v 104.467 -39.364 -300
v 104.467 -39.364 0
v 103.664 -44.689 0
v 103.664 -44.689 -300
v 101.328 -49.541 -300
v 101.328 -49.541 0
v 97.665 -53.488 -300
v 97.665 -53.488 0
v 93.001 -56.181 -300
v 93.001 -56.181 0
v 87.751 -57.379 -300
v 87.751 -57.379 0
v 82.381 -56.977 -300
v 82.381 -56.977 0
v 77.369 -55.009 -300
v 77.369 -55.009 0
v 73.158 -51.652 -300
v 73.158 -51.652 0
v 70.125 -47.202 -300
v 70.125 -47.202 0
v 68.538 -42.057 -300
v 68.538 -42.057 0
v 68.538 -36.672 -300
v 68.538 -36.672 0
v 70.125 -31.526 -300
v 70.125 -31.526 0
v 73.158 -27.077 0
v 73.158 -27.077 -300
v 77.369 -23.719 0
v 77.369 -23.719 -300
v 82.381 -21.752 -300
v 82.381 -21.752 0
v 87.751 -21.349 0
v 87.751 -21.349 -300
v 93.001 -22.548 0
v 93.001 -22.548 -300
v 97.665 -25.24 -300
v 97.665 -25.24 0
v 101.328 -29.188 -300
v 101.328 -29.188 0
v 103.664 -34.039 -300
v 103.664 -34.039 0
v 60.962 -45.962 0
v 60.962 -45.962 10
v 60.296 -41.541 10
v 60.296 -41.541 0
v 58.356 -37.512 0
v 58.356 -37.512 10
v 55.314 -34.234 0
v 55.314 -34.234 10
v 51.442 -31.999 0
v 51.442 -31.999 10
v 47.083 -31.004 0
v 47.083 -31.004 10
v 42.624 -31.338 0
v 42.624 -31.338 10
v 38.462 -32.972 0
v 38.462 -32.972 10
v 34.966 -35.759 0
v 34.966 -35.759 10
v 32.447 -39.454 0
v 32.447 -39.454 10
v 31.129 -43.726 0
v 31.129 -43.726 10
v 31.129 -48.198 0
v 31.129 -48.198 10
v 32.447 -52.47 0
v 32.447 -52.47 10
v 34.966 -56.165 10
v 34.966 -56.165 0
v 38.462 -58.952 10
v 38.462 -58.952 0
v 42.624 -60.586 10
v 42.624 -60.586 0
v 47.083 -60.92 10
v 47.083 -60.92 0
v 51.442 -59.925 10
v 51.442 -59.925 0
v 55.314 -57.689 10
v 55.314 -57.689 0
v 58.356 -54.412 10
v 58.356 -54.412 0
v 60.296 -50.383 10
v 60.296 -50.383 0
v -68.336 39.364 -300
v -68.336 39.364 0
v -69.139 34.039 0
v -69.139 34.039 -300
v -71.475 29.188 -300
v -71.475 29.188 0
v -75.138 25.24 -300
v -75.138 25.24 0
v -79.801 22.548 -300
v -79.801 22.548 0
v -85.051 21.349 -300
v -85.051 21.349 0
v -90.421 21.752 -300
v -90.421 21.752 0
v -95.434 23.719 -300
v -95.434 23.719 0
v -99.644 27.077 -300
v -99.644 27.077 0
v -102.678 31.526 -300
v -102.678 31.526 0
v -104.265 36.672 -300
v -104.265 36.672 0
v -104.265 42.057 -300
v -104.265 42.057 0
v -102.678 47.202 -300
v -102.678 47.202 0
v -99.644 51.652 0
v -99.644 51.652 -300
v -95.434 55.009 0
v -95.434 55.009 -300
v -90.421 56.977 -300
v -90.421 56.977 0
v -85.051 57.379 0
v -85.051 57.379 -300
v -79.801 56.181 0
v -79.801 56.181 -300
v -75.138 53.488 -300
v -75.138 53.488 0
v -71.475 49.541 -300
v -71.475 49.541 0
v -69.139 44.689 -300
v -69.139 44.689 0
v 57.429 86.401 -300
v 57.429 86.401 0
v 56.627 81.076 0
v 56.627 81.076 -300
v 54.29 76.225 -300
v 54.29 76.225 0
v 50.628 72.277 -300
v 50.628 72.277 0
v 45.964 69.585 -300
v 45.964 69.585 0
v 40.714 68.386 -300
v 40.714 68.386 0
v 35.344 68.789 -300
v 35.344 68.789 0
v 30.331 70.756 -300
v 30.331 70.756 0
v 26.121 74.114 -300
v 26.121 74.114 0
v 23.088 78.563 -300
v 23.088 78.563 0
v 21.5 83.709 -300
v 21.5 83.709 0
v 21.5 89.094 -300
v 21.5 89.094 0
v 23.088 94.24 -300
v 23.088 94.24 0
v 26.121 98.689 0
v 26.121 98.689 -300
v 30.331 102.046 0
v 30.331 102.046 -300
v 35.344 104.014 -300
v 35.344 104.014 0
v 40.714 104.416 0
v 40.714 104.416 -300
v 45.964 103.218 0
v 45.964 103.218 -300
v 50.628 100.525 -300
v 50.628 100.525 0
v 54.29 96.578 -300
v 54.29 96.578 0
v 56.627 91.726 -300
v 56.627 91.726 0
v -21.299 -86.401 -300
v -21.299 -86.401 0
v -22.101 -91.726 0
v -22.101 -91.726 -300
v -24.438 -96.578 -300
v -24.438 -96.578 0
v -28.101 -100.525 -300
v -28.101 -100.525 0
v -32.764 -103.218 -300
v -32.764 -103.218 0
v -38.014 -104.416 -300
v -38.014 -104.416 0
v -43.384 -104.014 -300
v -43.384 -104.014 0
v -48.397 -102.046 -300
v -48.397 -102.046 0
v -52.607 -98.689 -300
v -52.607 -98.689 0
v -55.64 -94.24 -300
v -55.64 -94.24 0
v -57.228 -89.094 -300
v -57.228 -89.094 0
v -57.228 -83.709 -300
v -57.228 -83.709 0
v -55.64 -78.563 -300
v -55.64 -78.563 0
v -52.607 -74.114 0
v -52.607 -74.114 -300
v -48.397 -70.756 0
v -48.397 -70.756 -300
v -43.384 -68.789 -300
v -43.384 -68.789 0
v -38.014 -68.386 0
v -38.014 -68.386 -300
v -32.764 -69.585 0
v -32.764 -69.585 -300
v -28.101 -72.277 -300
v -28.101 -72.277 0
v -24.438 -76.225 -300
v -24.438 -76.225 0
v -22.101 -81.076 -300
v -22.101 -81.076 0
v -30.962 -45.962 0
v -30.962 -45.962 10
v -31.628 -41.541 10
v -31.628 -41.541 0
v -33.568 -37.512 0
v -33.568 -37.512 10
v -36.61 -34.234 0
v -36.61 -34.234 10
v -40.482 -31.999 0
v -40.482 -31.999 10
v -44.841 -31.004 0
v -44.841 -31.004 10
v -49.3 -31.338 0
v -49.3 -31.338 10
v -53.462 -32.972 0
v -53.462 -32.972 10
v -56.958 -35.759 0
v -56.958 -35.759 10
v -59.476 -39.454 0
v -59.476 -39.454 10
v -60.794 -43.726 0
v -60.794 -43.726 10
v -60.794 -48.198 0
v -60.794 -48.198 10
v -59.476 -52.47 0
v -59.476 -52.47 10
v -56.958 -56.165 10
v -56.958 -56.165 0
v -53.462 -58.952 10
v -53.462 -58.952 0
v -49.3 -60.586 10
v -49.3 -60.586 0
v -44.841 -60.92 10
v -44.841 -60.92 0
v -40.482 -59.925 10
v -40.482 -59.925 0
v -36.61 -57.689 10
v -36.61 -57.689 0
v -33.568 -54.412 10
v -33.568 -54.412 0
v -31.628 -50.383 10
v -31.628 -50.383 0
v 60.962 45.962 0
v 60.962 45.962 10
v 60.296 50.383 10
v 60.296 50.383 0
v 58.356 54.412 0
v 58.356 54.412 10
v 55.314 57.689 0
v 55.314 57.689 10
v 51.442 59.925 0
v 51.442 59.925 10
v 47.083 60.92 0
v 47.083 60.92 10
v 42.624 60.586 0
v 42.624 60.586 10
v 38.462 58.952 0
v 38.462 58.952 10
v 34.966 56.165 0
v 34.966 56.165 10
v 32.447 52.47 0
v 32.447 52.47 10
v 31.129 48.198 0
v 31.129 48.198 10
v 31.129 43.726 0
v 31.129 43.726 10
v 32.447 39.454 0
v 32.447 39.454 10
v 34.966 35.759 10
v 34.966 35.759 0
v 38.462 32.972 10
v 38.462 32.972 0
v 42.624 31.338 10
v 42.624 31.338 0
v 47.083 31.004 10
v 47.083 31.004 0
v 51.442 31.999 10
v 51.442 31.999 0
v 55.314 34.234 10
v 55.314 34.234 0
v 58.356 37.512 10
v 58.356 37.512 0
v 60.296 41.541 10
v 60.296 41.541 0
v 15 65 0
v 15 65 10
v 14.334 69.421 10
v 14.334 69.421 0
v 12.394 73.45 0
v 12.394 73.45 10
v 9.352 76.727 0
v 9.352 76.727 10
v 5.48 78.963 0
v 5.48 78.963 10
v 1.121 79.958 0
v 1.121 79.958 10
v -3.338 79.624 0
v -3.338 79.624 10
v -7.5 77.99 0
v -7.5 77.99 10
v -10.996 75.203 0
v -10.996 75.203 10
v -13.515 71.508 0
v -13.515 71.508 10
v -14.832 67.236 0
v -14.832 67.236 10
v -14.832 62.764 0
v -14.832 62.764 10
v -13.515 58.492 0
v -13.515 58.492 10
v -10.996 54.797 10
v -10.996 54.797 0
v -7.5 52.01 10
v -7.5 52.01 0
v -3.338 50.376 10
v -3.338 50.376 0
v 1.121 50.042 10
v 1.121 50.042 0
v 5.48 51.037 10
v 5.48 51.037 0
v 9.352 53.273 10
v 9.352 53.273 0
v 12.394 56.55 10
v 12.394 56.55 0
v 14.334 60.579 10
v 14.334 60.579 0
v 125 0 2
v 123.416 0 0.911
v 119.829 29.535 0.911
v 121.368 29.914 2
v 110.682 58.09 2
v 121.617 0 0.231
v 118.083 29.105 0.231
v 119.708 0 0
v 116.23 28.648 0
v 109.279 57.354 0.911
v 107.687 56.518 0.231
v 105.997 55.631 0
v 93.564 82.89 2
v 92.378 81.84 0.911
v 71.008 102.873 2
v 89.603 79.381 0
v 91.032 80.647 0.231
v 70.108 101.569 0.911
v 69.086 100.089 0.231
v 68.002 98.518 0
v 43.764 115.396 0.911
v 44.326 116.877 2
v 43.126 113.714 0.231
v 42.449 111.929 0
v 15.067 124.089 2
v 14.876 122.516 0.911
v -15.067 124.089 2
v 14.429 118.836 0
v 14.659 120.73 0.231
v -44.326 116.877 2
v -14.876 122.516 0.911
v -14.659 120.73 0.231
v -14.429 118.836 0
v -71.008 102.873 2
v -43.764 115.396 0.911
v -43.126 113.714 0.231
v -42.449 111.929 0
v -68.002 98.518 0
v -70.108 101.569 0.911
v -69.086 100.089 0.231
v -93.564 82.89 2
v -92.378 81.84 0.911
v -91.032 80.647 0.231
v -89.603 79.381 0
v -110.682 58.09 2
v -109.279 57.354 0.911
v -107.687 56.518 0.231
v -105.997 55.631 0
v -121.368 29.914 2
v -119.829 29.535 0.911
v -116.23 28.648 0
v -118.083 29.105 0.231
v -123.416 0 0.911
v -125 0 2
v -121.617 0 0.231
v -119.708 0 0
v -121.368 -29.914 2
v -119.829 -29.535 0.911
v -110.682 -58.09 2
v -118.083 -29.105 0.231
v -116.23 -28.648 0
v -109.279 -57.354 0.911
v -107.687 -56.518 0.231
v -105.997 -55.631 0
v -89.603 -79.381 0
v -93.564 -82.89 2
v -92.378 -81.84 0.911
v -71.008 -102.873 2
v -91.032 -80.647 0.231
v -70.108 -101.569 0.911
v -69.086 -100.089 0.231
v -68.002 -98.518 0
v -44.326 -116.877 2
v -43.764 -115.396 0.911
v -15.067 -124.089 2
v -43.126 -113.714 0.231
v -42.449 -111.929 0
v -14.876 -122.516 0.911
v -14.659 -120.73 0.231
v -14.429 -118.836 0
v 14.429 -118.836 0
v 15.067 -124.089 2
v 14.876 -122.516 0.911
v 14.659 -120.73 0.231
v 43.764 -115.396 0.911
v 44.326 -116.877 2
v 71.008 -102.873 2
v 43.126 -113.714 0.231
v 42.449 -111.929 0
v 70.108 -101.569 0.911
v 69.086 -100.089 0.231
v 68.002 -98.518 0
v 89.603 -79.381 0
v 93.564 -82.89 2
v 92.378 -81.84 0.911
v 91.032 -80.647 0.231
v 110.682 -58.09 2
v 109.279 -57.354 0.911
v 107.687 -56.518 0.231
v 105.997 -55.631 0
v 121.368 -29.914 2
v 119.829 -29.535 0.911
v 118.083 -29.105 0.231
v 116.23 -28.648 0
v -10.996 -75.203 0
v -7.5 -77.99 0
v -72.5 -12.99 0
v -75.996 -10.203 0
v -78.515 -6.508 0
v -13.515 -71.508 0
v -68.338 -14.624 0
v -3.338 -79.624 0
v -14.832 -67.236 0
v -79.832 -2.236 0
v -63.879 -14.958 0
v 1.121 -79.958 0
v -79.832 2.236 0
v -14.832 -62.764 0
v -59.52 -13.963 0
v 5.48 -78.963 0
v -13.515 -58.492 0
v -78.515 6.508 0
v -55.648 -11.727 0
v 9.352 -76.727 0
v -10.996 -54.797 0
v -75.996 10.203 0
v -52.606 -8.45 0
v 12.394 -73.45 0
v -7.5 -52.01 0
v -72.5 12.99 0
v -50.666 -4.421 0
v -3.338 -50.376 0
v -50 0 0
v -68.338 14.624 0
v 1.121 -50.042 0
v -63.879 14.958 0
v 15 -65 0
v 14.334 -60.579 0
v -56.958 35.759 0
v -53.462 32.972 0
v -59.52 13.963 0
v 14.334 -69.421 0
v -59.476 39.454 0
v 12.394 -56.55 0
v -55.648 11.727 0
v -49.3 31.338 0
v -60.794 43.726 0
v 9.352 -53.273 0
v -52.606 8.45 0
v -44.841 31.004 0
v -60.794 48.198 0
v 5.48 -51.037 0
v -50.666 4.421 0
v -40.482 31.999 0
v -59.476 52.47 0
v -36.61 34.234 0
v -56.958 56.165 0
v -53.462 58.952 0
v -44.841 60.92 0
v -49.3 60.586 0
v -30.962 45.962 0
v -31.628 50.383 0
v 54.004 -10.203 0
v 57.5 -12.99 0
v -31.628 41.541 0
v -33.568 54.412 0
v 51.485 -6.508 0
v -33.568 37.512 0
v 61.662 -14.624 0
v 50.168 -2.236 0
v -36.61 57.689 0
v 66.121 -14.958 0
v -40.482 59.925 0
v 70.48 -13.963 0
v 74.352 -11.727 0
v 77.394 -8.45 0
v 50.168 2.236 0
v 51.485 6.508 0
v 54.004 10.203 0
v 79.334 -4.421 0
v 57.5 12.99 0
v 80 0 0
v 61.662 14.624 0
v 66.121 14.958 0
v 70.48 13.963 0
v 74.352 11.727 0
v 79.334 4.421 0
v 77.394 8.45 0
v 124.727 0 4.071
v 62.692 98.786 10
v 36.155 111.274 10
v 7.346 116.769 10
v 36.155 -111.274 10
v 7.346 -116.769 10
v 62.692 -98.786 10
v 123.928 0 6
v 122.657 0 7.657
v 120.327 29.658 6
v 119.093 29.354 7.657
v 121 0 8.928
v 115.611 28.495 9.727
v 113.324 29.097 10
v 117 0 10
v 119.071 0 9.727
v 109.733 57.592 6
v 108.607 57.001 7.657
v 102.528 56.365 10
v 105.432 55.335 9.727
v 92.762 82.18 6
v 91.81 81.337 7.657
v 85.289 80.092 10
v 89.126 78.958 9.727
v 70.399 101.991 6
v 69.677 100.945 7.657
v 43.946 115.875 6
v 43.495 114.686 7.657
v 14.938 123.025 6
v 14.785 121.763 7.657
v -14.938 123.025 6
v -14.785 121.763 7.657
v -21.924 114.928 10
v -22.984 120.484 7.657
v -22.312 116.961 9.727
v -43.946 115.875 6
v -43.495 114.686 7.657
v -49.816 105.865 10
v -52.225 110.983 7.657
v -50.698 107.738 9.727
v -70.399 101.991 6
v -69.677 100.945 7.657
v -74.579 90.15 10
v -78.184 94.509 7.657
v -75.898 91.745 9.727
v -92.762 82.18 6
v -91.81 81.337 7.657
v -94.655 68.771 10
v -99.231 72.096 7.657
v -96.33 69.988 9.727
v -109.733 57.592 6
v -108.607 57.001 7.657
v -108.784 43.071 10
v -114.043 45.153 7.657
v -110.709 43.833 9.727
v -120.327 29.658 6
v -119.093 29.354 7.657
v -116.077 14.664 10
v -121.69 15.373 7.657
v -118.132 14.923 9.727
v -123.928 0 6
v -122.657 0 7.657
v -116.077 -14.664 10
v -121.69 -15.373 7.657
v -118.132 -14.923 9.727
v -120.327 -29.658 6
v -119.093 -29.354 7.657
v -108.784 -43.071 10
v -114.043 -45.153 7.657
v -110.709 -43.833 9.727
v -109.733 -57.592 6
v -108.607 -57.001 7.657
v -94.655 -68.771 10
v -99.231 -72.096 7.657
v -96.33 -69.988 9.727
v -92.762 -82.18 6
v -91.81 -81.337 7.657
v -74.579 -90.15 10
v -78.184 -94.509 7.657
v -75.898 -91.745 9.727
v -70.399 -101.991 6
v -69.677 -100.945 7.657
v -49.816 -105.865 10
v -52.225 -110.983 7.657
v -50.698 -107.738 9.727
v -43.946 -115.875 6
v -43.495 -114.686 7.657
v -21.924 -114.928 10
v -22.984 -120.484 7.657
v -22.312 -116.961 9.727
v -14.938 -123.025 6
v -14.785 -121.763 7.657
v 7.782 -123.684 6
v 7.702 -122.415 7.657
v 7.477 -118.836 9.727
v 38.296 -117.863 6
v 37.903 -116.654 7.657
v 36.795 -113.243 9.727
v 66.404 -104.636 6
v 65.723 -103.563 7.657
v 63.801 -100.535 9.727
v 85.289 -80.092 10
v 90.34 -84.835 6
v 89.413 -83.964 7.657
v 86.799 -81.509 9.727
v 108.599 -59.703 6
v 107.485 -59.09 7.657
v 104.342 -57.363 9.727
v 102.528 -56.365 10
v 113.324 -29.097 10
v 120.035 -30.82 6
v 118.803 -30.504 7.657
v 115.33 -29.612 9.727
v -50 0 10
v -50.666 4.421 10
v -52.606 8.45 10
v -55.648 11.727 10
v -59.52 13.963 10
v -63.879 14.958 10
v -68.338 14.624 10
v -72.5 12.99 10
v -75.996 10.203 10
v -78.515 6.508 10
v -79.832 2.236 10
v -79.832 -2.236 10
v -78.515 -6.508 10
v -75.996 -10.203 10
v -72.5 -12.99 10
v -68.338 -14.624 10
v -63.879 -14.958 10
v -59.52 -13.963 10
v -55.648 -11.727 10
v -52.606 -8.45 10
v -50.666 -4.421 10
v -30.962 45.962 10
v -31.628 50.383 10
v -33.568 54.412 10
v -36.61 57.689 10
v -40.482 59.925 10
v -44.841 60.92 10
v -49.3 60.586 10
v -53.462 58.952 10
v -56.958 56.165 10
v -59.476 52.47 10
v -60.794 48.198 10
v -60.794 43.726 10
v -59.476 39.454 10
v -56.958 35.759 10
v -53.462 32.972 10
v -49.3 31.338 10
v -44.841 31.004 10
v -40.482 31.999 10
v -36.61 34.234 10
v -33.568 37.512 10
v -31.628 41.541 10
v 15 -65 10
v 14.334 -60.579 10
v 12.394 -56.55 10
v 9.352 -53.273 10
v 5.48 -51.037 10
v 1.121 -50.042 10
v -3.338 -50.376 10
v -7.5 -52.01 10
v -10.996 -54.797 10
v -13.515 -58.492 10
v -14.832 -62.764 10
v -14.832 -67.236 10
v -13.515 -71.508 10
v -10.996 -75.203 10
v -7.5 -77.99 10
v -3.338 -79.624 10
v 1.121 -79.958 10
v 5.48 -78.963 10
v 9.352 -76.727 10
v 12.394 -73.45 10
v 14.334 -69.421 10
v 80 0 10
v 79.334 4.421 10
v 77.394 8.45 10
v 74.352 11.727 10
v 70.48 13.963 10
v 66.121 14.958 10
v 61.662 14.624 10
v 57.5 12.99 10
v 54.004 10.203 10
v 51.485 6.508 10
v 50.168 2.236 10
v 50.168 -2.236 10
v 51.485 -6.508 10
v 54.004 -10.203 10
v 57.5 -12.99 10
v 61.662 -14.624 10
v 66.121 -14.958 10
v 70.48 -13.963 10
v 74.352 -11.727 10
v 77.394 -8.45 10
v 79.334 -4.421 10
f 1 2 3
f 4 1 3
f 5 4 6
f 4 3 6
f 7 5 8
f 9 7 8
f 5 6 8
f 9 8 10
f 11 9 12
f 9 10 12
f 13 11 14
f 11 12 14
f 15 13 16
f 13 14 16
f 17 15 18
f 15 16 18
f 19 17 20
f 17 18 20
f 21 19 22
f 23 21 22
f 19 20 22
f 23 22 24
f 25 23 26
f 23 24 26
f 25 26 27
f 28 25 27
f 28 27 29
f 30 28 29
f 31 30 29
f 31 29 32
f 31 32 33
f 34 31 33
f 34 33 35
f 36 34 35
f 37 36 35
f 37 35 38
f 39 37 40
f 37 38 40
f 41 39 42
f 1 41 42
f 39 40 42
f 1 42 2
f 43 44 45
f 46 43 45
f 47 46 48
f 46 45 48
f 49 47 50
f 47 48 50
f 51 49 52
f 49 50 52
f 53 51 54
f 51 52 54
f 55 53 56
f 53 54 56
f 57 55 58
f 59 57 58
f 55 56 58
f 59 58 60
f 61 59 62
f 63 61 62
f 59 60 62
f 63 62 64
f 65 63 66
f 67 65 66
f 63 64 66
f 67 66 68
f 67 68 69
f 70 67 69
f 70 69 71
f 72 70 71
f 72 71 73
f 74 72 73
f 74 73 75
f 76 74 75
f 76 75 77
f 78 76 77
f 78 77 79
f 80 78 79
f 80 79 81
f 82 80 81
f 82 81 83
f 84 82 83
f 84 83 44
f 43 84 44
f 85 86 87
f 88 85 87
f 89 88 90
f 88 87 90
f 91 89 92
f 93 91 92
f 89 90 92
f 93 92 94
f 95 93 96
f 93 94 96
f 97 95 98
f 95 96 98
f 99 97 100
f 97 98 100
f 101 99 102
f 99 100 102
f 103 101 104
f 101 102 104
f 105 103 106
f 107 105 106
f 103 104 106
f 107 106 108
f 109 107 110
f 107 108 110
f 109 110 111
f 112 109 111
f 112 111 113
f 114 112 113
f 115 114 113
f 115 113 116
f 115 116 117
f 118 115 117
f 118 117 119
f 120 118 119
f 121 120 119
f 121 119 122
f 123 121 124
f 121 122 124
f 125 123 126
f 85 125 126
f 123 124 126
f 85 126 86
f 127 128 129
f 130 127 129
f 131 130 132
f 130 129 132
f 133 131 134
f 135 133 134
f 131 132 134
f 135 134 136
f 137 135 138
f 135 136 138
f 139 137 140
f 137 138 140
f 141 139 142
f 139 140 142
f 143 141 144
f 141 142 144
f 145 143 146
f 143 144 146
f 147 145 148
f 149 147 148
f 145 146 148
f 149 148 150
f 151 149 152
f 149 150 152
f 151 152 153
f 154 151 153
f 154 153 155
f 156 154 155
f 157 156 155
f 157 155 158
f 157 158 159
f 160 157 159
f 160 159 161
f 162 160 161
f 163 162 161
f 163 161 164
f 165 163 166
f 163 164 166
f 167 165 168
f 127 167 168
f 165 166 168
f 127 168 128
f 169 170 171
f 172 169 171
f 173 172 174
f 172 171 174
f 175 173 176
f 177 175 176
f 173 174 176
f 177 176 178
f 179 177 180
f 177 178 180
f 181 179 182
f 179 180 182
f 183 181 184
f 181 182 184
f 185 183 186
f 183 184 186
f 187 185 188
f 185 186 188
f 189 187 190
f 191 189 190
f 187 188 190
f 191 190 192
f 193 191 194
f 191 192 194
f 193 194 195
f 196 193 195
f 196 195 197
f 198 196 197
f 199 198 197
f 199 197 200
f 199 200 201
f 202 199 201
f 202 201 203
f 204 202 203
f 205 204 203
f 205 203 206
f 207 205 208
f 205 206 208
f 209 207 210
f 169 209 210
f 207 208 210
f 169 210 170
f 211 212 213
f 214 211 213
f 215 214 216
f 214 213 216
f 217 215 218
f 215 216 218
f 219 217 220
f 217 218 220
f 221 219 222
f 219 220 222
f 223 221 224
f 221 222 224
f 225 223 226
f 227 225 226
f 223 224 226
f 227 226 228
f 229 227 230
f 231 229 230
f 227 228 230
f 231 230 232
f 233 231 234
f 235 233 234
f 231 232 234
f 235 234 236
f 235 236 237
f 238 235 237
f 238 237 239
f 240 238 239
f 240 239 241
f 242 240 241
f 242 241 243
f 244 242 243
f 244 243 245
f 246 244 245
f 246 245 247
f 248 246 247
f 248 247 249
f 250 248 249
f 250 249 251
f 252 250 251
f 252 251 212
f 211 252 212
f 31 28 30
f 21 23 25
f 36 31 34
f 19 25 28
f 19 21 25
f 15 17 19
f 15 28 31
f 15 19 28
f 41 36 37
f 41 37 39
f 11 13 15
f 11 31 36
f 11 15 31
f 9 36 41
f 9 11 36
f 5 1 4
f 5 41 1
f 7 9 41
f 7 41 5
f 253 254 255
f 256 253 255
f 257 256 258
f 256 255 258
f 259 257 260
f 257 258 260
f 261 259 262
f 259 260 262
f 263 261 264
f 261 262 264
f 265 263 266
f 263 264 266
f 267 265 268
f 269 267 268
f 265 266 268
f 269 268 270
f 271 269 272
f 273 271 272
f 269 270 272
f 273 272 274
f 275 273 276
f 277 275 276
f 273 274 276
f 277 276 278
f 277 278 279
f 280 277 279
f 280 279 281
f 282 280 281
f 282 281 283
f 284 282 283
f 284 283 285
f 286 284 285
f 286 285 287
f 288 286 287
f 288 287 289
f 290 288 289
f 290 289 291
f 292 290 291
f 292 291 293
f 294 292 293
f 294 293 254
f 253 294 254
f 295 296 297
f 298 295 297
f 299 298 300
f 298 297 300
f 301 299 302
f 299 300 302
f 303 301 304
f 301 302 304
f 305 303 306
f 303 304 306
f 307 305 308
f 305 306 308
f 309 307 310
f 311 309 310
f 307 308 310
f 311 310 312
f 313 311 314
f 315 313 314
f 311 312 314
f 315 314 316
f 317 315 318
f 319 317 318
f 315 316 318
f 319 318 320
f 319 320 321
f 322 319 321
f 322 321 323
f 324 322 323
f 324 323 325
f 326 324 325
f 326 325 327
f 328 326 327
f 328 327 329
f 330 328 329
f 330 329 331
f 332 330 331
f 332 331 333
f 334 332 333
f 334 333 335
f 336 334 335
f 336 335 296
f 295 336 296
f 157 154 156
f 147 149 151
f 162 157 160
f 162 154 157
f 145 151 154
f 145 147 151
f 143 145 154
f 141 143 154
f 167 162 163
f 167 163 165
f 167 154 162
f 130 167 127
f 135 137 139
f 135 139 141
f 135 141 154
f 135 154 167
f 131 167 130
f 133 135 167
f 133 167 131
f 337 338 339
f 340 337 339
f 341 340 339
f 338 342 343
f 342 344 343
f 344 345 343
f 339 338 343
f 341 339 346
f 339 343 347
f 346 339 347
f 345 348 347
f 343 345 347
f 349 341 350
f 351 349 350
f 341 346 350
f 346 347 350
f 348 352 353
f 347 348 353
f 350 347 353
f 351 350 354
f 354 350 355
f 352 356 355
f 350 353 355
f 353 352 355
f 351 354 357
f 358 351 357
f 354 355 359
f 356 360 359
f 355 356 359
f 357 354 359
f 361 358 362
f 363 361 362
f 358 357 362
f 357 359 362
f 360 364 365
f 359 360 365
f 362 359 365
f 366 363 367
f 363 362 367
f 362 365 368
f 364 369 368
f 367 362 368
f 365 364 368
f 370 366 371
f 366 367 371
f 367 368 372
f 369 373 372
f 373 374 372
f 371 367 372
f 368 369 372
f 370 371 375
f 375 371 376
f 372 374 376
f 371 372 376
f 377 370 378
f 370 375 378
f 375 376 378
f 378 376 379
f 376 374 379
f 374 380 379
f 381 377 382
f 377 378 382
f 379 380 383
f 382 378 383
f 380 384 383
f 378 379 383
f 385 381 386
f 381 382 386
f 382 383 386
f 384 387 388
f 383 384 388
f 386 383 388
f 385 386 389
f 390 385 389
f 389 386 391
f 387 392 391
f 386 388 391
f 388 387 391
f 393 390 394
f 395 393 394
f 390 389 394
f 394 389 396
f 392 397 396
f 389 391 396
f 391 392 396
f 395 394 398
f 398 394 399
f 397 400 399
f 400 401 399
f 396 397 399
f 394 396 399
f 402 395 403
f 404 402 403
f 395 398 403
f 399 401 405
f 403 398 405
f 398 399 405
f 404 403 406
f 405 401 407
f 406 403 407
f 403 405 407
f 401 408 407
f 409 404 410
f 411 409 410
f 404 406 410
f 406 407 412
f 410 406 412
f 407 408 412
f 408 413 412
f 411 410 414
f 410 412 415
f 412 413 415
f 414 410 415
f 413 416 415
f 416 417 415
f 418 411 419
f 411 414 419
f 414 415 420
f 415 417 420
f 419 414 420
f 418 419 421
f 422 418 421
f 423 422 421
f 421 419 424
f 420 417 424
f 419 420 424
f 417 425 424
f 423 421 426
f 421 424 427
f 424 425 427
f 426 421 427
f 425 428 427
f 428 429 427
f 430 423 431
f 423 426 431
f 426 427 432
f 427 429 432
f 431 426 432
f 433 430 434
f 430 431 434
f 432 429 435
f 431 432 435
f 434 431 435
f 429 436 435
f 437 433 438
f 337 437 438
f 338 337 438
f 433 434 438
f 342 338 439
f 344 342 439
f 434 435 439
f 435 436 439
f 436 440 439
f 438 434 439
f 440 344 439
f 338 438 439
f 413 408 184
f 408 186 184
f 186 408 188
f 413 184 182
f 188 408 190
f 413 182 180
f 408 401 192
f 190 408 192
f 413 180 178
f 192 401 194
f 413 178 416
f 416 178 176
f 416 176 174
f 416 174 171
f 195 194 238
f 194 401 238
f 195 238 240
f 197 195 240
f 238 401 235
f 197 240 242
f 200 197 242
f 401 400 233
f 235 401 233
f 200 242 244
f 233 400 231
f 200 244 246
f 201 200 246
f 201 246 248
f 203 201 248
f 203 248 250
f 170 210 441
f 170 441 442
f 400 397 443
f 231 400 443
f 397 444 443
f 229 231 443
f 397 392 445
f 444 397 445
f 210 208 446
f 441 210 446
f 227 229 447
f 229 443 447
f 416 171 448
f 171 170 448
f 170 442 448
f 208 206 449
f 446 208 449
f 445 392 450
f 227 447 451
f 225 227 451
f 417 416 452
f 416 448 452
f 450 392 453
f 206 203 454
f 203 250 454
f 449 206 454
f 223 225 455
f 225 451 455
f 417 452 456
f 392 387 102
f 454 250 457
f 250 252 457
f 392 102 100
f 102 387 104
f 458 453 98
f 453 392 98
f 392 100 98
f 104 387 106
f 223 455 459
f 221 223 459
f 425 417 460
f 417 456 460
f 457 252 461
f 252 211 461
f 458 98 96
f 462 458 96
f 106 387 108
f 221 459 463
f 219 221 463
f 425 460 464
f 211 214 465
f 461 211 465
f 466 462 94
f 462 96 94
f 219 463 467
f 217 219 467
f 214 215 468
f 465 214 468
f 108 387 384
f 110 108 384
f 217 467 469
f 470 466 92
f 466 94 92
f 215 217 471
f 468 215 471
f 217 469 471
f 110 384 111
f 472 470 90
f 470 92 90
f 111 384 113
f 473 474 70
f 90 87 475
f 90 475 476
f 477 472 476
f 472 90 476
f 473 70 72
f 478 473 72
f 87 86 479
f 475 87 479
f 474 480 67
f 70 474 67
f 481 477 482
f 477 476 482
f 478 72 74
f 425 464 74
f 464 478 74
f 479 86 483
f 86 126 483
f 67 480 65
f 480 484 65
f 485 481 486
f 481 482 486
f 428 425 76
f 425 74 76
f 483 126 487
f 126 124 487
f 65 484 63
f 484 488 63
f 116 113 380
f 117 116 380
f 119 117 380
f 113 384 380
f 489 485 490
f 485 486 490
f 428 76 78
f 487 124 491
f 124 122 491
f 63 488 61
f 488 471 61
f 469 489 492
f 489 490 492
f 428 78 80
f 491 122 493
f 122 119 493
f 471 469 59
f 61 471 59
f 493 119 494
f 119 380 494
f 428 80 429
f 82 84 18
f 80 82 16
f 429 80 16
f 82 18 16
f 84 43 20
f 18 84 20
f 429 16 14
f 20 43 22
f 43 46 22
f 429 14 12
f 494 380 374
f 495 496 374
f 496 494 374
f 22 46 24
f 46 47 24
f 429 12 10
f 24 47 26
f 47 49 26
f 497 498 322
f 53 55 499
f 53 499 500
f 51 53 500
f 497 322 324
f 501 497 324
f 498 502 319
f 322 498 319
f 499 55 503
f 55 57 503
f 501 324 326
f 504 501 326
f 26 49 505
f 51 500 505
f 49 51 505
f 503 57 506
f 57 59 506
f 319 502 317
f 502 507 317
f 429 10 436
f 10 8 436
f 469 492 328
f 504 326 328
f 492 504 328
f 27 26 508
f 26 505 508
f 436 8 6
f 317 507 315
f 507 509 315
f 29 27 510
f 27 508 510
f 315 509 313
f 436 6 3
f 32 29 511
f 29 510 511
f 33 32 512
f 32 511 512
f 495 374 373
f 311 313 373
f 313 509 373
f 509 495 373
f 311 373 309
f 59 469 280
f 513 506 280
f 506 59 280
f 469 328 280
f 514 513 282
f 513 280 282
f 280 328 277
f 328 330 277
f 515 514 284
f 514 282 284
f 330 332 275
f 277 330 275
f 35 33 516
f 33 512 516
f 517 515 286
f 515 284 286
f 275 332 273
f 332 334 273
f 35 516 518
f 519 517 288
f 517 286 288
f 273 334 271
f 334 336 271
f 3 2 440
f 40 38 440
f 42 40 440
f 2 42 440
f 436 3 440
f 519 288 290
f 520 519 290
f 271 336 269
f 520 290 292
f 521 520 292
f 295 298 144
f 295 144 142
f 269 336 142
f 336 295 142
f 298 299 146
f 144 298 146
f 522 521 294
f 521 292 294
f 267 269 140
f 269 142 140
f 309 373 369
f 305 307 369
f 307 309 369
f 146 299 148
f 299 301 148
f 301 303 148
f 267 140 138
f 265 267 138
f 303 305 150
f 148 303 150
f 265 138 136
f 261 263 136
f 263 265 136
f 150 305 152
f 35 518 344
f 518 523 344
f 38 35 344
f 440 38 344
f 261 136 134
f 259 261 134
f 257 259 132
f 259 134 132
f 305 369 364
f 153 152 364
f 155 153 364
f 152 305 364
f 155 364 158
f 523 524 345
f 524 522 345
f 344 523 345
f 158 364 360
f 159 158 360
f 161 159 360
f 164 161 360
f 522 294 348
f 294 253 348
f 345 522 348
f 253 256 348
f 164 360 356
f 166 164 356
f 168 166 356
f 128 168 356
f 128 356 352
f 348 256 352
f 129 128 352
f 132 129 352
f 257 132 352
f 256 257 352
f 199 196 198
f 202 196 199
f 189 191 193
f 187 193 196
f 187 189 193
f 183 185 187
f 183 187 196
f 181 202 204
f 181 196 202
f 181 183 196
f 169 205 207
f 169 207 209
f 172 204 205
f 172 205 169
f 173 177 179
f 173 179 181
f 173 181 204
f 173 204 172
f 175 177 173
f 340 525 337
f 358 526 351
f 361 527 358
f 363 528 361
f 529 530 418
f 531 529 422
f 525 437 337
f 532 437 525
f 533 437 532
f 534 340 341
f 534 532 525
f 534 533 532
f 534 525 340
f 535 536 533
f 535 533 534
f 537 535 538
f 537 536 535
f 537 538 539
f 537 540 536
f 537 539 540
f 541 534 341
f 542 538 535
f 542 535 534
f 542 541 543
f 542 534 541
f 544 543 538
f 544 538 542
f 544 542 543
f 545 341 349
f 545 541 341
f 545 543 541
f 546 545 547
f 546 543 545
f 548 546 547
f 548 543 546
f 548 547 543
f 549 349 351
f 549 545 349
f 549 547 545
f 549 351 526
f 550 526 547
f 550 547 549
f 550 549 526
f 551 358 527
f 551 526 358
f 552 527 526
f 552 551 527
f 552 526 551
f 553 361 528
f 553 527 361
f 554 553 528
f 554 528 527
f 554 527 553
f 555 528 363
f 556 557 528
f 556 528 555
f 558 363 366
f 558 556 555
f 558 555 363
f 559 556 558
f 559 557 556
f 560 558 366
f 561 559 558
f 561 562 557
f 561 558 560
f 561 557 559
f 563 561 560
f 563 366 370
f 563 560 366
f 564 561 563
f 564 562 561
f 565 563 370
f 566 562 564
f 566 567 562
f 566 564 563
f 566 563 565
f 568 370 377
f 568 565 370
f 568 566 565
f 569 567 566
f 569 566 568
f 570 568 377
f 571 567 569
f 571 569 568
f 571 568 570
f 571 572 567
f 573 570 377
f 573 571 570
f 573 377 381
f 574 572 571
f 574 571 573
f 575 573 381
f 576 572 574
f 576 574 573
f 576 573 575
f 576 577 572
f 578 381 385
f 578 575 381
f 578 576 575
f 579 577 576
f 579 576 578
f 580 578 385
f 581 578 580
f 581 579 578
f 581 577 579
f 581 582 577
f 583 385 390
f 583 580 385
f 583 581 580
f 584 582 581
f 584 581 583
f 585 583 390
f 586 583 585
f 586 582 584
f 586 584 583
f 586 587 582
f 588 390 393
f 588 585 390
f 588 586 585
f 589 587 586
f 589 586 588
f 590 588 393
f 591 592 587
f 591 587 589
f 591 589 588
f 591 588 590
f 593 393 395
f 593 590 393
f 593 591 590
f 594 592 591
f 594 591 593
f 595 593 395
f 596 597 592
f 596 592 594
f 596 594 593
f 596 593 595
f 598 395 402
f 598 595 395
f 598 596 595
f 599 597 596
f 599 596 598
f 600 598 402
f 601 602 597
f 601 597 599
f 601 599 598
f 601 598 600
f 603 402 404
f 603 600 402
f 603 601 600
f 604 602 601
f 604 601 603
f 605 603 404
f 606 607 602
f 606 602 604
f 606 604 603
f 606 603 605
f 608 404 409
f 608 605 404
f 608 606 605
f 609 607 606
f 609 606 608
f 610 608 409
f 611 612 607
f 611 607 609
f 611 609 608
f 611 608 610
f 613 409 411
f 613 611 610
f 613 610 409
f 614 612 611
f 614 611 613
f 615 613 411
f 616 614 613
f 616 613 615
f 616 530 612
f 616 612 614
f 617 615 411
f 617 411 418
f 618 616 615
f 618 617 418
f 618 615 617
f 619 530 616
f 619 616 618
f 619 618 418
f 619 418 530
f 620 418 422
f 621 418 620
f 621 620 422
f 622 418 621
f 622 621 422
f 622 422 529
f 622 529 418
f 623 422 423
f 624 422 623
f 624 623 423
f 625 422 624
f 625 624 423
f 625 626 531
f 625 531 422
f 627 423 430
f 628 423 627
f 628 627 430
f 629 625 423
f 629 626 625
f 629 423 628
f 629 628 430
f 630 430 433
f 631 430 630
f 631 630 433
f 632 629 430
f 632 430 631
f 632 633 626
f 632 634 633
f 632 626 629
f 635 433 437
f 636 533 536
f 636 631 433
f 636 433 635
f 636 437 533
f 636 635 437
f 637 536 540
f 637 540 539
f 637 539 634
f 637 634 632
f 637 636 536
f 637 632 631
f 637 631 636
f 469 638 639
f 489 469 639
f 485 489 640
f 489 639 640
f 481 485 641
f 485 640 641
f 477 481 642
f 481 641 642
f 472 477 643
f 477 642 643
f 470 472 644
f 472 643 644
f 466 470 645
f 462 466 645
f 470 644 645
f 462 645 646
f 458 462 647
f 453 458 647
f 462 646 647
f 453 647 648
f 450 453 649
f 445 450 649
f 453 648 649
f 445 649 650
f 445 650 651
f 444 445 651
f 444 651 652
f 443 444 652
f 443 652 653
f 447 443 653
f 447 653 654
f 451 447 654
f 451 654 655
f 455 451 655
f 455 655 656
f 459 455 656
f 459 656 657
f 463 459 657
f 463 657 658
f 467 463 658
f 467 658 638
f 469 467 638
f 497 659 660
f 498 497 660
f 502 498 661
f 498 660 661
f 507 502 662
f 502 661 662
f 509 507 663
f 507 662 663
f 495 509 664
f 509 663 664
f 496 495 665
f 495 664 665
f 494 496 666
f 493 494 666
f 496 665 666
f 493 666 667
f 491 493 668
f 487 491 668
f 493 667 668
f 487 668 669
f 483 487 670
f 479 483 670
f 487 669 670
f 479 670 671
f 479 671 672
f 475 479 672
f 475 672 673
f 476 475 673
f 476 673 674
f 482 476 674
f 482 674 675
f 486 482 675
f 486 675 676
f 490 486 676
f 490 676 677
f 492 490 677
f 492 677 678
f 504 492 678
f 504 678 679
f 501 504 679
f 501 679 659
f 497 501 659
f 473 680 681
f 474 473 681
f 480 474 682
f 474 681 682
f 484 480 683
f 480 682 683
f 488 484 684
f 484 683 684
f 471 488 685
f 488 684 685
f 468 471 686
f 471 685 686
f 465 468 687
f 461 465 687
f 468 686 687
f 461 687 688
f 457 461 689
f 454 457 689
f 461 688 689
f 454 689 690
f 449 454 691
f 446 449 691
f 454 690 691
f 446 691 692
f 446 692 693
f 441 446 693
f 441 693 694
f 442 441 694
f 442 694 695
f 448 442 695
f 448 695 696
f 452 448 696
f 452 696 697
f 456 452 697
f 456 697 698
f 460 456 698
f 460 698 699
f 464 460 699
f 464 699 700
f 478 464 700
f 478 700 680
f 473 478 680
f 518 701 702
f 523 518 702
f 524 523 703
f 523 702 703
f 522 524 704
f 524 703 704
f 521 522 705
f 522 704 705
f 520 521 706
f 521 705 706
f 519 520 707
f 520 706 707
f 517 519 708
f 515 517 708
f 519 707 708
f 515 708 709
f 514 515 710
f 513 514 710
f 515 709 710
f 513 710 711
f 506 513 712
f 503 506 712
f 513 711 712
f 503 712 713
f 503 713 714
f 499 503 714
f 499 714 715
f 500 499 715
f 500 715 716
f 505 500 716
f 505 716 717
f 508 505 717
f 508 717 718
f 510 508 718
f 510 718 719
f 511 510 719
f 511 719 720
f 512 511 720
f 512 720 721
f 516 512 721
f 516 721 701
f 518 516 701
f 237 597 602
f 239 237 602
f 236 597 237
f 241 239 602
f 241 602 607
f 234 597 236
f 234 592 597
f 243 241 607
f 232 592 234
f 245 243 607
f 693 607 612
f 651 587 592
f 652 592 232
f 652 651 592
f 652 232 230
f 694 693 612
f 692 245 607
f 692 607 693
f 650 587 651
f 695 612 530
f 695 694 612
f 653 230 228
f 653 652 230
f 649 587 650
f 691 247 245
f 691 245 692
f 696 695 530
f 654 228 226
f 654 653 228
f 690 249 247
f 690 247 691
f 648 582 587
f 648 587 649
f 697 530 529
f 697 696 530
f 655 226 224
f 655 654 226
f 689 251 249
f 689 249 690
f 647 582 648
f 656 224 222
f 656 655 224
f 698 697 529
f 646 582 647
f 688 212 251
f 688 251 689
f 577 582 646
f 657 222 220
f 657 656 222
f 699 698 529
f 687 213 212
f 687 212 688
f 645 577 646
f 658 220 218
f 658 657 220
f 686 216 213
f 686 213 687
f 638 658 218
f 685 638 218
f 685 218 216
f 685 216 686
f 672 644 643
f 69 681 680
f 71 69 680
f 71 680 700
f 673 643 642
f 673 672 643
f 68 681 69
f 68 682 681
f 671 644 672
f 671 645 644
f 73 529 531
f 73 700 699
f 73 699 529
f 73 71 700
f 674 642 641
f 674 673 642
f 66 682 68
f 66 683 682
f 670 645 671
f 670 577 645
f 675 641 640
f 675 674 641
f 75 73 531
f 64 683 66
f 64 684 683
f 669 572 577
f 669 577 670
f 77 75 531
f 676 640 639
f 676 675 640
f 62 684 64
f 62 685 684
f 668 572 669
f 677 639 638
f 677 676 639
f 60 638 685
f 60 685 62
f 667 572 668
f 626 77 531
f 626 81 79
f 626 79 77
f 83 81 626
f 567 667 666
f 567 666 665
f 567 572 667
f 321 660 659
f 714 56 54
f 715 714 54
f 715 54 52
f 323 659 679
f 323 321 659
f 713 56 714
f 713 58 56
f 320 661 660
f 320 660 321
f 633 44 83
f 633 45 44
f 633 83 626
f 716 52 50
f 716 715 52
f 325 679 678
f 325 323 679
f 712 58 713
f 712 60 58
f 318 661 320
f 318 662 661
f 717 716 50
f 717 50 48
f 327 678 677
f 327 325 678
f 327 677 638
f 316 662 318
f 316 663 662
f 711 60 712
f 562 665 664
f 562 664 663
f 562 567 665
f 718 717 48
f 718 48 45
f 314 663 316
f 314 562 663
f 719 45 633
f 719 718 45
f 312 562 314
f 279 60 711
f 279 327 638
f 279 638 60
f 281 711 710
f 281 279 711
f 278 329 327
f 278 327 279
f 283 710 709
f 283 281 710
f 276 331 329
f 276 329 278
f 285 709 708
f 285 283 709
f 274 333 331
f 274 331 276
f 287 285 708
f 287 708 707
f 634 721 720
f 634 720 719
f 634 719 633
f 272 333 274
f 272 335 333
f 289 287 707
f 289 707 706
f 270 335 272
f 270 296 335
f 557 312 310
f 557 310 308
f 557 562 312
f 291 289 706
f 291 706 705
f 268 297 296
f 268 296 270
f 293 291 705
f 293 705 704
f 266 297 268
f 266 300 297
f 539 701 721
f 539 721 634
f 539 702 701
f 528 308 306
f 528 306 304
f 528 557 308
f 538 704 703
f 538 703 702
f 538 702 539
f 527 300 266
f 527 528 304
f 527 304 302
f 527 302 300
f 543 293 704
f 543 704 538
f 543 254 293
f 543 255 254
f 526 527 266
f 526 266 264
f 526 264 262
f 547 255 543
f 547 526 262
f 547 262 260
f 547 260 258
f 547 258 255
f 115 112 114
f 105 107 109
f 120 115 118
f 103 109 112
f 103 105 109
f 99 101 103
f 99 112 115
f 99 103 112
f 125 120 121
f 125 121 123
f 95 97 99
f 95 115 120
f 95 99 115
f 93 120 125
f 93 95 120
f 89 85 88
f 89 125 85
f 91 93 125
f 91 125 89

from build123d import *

# Parameters (mm, degrees)
F0_R     = 125
F2_DEPTH = 10
F1_R     = 15
F3_DEPTH = 39
F4_DEPTH = 107
F5_R     = 8
F7_R     = 18.065377162
F8_DEPTH = 300


# Not quite as in the source:
# - a fillet or chamfer that OpenCascade refuses, or shapes differently, is made with other operations: its cross-section is extruded or revolved along the edge and cut away or added


with BuildPart() as f2:
    # F0 (on Top) → F2 (new body)
    with BuildSketch(Plane.XY):
        Circle(F0_R)
    extrude(amount=F2_DEPTH)

    # F1 (on face) → F3 (join)
    with BuildSketch(Plane.XY):
        with Locations((-45.9619407771, -45.9619407771)):
            Circle(F1_R)
        with Locations((-65, 0)):
            Circle(F1_R)
        with Locations((0, 65)):
            Circle(F1_R)
        with Locations((0, -65)):
            Circle(F1_R)
        with Locations((45.9619407771, -45.9619407771)):
            Circle(F1_R)
        with Locations((65, 0)):
            Circle(F1_R)
        with Locations((45.9619407771, 45.9619407771)):
            Circle(F1_R)
        with Locations((-45.9619407771, 45.9619407771)):
            Circle(F1_R)
    extrude(amount=F3_DEPTH)

    # F4 (cut): faces of the model
    f4_faces = [f2.faces().sort_by_distance(p)[0] for p in [
        (-45.9619407771, -45.9619407771, 39),
        (0, -65, 39),
        (45.9619407771, -45.9619407771, 39),
        (65, 0, 39),
        (45.9619407771, 45.9619407771, 39),
        (0, 65, 39),
        (-45.9619407771, 45.9619407771, 39),
        (-65, 0, 39),
    ]]
    extrude(f4_faces, amount=-F4_DEPTH, mode=Mode.SUBTRACT)

    # F5
    f5_edges = [f2.edges().sort_by_distance(p)[0] for p in [
        (-125, 0, 10),
    ]]
    fillet(f5_edges, radius=F5_R)

    # F6: fillet of radius 8 on 1 edges, made by hand

    # F6_s1 → F6_t2 (revolve, cut)
    with BuildSketch(Plane.XZ):
        with BuildLine():
            ThreePointArc((125, 2), (122.5369245026, 0.5166852265), (119.7084973779, 0))
            Line((119.7084973779, 0), (125, 0))
            Line((125, 0), (125, 2))
        make_face()
    revolve(axis=Axis((0, 0, 0), (0, 0, 1)), mode=Mode.SUBTRACT)

    # F7 (on face) → F8 (join)
    with BuildSketch(Plane(origin=(0, 0, 0), x_dir=(1, 0, 0), z_dir=(0, 0, -1))):
        with Locations((39.3640957773, -86.4013507962)):
            Circle(F7_R)
        with Locations((-86.4013507962, -39.3640957773)):
            Circle(F7_R)
        with Locations((-39.3640957773, 86.4013507962)):
            Circle(F7_R)
        with Locations((86.4013507962, 39.3640957773)):
            Circle(F7_R)
    extrude(amount=F8_DEPTH)


solid = f2.part
